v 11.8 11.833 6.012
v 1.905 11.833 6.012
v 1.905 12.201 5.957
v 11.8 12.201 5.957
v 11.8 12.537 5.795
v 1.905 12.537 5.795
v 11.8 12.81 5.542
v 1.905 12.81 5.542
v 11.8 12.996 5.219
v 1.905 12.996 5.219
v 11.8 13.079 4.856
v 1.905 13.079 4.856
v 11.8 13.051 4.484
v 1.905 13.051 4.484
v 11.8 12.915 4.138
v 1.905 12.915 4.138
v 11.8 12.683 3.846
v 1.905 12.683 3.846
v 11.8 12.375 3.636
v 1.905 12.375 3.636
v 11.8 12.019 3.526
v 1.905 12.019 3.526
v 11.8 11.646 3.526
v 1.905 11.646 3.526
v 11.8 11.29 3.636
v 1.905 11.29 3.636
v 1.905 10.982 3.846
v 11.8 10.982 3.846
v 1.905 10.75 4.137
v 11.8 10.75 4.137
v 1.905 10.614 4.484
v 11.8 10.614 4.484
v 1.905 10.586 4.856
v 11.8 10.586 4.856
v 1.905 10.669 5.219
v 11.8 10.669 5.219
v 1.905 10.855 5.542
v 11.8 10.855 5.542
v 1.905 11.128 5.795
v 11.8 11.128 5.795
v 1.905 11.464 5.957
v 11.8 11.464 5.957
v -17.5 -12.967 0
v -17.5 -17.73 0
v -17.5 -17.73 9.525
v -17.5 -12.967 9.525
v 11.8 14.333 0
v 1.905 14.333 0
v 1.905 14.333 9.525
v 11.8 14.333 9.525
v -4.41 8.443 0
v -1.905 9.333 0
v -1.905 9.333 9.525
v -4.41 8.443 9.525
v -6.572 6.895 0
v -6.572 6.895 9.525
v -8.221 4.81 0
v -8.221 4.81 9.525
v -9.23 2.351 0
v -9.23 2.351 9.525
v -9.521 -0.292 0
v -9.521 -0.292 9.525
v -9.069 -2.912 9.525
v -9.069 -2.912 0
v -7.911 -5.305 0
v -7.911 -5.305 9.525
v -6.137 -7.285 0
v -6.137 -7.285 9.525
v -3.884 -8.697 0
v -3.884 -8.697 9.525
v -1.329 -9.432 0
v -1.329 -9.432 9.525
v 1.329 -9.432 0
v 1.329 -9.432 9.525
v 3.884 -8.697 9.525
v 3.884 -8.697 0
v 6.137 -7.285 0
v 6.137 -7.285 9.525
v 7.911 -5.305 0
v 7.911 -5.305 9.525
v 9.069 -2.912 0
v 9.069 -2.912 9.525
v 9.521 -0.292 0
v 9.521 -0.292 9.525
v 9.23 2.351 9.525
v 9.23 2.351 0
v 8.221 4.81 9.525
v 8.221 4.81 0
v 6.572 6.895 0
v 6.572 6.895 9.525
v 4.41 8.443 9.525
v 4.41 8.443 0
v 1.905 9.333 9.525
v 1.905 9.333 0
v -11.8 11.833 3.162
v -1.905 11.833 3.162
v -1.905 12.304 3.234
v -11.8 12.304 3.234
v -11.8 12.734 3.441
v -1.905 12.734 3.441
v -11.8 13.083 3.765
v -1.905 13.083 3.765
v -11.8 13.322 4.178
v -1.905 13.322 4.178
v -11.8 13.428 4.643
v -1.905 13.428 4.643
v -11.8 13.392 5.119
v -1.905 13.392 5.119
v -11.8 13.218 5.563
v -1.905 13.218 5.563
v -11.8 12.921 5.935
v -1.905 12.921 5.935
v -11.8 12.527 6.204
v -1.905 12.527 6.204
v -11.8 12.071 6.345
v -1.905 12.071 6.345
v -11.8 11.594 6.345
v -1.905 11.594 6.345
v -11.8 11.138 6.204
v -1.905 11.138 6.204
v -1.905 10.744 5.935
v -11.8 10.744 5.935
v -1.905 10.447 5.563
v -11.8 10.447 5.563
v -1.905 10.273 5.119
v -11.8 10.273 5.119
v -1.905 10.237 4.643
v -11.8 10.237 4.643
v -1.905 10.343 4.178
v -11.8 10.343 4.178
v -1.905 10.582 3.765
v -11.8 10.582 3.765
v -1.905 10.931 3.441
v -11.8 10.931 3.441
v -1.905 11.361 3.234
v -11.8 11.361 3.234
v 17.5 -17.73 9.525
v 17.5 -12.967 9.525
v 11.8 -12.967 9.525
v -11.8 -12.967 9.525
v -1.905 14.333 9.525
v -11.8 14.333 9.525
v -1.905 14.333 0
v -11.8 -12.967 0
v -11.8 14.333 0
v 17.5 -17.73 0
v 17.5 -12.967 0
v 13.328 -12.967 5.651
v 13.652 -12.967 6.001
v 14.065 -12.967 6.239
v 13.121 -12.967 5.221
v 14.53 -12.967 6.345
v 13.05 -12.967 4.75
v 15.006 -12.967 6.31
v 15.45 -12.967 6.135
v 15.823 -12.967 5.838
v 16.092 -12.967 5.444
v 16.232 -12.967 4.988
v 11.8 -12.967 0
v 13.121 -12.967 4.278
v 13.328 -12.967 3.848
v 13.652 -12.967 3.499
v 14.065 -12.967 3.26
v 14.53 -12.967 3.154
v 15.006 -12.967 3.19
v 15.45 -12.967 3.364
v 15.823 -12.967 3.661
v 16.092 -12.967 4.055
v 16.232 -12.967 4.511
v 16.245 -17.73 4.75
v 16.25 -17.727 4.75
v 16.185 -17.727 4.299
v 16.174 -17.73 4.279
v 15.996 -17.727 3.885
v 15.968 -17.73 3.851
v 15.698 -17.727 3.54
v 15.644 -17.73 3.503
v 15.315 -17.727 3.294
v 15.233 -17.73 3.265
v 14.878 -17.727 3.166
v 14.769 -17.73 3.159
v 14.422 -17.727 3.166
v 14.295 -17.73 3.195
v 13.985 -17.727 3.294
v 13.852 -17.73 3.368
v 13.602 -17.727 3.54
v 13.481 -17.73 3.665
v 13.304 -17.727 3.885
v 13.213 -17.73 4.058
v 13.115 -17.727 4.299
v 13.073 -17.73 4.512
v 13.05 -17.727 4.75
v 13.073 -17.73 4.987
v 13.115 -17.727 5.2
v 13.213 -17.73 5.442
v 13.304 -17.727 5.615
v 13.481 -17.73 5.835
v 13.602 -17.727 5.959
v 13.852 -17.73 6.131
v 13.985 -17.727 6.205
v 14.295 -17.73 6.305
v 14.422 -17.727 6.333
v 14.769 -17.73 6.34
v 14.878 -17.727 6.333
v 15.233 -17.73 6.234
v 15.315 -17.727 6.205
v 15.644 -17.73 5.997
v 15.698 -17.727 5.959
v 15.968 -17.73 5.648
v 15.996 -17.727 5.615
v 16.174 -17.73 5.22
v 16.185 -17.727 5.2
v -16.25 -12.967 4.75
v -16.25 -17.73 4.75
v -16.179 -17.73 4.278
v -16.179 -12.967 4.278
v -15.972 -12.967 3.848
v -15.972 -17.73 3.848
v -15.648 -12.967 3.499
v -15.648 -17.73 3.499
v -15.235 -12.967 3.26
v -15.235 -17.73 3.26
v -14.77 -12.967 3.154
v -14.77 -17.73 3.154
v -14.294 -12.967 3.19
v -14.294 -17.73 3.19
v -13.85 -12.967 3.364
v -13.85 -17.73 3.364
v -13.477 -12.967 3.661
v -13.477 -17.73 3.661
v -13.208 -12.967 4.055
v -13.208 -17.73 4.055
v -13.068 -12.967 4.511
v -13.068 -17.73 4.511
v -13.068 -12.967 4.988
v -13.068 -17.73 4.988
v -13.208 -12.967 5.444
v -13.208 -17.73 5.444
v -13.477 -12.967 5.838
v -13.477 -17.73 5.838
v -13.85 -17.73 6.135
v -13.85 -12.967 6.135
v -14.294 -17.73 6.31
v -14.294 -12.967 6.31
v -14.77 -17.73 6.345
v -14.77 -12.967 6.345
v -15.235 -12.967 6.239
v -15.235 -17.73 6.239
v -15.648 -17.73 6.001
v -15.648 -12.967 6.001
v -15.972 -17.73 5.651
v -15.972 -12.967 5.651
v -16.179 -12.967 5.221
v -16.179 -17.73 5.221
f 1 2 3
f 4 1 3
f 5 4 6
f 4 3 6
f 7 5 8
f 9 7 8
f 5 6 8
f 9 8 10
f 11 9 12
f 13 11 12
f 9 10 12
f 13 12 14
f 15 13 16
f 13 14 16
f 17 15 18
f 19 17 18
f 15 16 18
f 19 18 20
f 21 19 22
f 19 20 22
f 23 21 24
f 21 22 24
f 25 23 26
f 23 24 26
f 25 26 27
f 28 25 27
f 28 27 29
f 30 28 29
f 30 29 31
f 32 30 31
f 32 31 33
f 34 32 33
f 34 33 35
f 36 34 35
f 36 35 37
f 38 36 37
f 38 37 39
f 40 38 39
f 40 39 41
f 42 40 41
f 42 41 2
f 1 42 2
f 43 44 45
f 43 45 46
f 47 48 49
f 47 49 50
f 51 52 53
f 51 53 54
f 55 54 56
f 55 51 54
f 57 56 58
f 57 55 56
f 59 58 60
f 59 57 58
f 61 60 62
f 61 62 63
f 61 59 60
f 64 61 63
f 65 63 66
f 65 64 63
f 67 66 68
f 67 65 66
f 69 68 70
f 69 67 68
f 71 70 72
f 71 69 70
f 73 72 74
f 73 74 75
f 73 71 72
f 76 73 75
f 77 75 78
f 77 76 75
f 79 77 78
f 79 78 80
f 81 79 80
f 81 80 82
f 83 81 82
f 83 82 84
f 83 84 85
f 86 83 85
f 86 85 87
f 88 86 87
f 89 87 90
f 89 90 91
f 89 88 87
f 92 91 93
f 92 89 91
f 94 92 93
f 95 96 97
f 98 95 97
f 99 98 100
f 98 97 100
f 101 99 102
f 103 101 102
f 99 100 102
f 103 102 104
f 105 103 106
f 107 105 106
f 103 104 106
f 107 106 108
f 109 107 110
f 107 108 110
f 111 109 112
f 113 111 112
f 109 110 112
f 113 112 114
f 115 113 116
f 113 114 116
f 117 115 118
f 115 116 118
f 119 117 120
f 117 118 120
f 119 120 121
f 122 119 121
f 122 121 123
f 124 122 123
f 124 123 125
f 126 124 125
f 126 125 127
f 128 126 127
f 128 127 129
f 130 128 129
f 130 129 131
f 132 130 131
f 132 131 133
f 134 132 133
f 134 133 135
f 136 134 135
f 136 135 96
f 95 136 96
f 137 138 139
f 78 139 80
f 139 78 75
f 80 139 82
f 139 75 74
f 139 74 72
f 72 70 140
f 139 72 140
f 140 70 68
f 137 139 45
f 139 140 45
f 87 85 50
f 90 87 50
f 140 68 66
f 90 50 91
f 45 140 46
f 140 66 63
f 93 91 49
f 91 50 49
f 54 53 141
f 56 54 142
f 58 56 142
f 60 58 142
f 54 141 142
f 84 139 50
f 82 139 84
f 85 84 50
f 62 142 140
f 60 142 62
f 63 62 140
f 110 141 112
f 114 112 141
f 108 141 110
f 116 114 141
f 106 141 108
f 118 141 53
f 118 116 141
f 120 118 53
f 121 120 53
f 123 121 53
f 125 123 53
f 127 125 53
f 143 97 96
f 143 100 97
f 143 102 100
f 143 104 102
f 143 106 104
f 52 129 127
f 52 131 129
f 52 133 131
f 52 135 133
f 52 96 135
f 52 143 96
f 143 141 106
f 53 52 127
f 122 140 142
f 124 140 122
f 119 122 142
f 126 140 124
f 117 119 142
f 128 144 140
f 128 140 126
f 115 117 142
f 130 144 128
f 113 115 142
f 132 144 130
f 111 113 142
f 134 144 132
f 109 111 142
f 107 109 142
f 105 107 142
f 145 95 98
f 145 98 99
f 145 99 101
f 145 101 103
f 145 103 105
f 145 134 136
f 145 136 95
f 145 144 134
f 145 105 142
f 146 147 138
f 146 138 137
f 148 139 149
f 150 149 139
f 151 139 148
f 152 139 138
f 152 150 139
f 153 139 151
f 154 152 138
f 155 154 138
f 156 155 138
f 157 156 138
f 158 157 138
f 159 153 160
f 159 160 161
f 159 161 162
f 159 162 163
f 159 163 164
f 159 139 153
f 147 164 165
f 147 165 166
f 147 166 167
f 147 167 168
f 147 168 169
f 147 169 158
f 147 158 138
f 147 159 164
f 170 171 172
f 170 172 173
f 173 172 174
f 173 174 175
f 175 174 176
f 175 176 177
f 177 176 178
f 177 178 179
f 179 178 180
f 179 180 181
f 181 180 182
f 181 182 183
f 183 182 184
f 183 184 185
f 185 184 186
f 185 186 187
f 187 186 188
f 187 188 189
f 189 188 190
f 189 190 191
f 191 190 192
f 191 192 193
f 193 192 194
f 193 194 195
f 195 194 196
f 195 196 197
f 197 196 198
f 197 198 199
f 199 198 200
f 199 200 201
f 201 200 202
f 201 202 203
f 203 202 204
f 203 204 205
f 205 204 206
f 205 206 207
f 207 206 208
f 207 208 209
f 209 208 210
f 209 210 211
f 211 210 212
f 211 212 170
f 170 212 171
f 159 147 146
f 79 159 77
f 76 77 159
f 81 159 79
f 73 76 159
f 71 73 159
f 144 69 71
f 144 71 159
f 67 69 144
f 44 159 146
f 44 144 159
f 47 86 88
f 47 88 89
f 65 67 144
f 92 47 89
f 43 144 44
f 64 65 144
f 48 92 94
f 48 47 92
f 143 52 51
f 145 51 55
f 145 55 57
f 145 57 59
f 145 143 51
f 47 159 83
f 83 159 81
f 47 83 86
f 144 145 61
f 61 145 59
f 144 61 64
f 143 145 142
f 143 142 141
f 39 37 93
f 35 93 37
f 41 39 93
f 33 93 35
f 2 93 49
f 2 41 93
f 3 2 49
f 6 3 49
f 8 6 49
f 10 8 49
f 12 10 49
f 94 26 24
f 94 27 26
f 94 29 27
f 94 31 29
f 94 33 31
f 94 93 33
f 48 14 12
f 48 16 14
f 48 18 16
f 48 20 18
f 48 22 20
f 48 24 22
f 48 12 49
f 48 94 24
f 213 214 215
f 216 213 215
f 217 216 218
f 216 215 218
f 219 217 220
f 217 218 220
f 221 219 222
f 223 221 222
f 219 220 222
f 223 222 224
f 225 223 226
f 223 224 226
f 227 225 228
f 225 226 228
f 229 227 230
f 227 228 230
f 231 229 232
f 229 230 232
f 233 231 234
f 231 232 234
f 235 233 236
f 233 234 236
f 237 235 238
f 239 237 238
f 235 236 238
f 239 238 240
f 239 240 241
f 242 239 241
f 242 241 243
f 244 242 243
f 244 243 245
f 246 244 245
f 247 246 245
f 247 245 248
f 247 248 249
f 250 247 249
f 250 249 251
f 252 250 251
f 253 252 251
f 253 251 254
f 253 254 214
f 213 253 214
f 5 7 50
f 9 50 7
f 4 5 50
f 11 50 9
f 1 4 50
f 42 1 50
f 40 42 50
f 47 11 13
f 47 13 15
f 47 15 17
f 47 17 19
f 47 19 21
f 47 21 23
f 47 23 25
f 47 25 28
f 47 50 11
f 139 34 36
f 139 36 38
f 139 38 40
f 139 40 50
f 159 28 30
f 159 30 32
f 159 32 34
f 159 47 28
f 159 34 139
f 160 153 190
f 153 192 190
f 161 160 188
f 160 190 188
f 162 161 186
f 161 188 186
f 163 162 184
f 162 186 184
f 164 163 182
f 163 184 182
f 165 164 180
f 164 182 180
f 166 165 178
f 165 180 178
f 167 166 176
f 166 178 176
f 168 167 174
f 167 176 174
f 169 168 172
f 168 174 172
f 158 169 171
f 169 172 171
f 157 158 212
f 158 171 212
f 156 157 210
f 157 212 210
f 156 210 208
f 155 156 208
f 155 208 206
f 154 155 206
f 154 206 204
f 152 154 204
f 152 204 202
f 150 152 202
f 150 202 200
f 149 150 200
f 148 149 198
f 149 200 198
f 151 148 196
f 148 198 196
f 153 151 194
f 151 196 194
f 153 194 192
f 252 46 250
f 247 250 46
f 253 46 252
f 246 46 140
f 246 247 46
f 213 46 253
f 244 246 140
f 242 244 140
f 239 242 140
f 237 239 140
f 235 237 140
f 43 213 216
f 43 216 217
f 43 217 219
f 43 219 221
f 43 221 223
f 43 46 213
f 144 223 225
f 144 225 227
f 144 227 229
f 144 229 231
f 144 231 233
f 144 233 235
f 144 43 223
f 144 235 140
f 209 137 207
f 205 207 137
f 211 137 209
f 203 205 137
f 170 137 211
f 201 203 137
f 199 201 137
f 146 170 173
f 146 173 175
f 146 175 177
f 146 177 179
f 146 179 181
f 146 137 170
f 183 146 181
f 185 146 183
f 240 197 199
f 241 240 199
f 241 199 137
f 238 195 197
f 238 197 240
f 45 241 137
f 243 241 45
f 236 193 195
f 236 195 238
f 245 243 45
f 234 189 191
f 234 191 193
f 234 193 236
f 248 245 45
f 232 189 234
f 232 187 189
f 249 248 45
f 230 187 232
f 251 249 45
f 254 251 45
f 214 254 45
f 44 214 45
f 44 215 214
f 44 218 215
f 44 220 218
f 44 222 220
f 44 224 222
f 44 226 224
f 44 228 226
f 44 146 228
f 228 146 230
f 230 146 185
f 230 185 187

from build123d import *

# Parameters (mm, degrees)
BOSS_EXTRUDE3_DEPTH             = 9.525
TAP_DRILL_FOR_M3X0_5_TAP1_D     = 2.5
TAP_DRILL_FOR_M3X0_5_TAP1_DEPTH = 9.895
M3_CLEARANCE_HOLE1_D            = 3.2
M3_CLEARANCE_HOLE2_D            = 3.2
M3_CLEARANCE_HOLE2_DEPTH        = 4.76
M3_CLEARANCE_HOLE2_TIP          = 0.96137699
M3_CLEARANCE_HOLE3_D            = 3.2
M3_CLEARANCE_HOLE3_DEPTH        = 9.895


with BuildPart() as part:
    # Sketch7 → Boss-Extrude3 (new body)
    with BuildSketch(Plane.XY):
        with BuildLine():
            Line((-11.8, 14.33255592), (-1.905, 14.33255592))
            Line((-1.905, 14.33255592), (-1.905, 9.33255592))
            ThreePointArc((-1.905, 9.33255592), (0, -9.525), (1.905, 9.33255592))
            Line((1.905, 9.33255592), (1.905, 14.33255592))
            Line((1.905, 14.33255592), (11.8, 14.33255592))
            Line((11.8, 14.33255592), (11.8, -12.96744408))
            Line((11.8, -12.96744408), (17.5, -12.96744408))
            Line((17.5, -12.96744408), (17.5, -17.73044408))
            Line((17.5, -17.73044408), (-17.5, -17.73044408))
            Line((-17.5, -17.73044408), (-17.5, -12.96744408))
            Line((-17.5, -12.96744408), (-11.8, -12.96744408))
            Line((-11.8, -12.96744408), (-11.8, 14.33255592))
        make_face()
    extrude(amount=BOSS_EXTRUDE3_DEPTH)

    # Tap Drill for M3x0.5 Tap1
    with Locations(Plane(origin=(11.8, 0, 0), x_dir=(0, 0, -1), z_dir=(1, 0, 0))):
        with Locations((-4.7625, 11.83255592)):
            Hole(TAP_DRILL_FOR_M3X0_5_TAP1_D / 2, depth=TAP_DRILL_FOR_M3X0_5_TAP1_DEPTH)

    # M3 Clearance Hole1 (through all)
    with Locations(Plane(origin=(0, -12.96744408, 0), x_dir=(1, 0, 0), z_dir=(0, 1, 0))):
        with Locations((-14.65, -4.749621695)):
            Hole(M3_CLEARANCE_HOLE1_D / 2)

    # M3 Clearance Hole2
    with Locations(Plane(origin=(0, -12.96744408, 0), x_dir=(1, 0, 0), z_dir=(0, 1, 0))):
        with Locations((14.65, -4.749621695)):
            Hole(M3_CLEARANCE_HOLE2_D / 2, depth=M3_CLEARANCE_HOLE2_DEPTH)
            with Locations((0, 0, -(M3_CLEARANCE_HOLE2_DEPTH + M3_CLEARANCE_HOLE2_TIP / 2))):  # 118° drill point
                Cone(0, M3_CLEARANCE_HOLE2_D / 2, M3_CLEARANCE_HOLE2_TIP, mode=Mode.SUBTRACT)

    # M3 Clearance Hole3
    with Locations(Plane.ZY.offset(11.8)):
        with Locations((4.7625, 11.83255592)):
            Hole(M3_CLEARANCE_HOLE3_D / 2, depth=M3_CLEARANCE_HOLE3_DEPTH)


solid = part.part
